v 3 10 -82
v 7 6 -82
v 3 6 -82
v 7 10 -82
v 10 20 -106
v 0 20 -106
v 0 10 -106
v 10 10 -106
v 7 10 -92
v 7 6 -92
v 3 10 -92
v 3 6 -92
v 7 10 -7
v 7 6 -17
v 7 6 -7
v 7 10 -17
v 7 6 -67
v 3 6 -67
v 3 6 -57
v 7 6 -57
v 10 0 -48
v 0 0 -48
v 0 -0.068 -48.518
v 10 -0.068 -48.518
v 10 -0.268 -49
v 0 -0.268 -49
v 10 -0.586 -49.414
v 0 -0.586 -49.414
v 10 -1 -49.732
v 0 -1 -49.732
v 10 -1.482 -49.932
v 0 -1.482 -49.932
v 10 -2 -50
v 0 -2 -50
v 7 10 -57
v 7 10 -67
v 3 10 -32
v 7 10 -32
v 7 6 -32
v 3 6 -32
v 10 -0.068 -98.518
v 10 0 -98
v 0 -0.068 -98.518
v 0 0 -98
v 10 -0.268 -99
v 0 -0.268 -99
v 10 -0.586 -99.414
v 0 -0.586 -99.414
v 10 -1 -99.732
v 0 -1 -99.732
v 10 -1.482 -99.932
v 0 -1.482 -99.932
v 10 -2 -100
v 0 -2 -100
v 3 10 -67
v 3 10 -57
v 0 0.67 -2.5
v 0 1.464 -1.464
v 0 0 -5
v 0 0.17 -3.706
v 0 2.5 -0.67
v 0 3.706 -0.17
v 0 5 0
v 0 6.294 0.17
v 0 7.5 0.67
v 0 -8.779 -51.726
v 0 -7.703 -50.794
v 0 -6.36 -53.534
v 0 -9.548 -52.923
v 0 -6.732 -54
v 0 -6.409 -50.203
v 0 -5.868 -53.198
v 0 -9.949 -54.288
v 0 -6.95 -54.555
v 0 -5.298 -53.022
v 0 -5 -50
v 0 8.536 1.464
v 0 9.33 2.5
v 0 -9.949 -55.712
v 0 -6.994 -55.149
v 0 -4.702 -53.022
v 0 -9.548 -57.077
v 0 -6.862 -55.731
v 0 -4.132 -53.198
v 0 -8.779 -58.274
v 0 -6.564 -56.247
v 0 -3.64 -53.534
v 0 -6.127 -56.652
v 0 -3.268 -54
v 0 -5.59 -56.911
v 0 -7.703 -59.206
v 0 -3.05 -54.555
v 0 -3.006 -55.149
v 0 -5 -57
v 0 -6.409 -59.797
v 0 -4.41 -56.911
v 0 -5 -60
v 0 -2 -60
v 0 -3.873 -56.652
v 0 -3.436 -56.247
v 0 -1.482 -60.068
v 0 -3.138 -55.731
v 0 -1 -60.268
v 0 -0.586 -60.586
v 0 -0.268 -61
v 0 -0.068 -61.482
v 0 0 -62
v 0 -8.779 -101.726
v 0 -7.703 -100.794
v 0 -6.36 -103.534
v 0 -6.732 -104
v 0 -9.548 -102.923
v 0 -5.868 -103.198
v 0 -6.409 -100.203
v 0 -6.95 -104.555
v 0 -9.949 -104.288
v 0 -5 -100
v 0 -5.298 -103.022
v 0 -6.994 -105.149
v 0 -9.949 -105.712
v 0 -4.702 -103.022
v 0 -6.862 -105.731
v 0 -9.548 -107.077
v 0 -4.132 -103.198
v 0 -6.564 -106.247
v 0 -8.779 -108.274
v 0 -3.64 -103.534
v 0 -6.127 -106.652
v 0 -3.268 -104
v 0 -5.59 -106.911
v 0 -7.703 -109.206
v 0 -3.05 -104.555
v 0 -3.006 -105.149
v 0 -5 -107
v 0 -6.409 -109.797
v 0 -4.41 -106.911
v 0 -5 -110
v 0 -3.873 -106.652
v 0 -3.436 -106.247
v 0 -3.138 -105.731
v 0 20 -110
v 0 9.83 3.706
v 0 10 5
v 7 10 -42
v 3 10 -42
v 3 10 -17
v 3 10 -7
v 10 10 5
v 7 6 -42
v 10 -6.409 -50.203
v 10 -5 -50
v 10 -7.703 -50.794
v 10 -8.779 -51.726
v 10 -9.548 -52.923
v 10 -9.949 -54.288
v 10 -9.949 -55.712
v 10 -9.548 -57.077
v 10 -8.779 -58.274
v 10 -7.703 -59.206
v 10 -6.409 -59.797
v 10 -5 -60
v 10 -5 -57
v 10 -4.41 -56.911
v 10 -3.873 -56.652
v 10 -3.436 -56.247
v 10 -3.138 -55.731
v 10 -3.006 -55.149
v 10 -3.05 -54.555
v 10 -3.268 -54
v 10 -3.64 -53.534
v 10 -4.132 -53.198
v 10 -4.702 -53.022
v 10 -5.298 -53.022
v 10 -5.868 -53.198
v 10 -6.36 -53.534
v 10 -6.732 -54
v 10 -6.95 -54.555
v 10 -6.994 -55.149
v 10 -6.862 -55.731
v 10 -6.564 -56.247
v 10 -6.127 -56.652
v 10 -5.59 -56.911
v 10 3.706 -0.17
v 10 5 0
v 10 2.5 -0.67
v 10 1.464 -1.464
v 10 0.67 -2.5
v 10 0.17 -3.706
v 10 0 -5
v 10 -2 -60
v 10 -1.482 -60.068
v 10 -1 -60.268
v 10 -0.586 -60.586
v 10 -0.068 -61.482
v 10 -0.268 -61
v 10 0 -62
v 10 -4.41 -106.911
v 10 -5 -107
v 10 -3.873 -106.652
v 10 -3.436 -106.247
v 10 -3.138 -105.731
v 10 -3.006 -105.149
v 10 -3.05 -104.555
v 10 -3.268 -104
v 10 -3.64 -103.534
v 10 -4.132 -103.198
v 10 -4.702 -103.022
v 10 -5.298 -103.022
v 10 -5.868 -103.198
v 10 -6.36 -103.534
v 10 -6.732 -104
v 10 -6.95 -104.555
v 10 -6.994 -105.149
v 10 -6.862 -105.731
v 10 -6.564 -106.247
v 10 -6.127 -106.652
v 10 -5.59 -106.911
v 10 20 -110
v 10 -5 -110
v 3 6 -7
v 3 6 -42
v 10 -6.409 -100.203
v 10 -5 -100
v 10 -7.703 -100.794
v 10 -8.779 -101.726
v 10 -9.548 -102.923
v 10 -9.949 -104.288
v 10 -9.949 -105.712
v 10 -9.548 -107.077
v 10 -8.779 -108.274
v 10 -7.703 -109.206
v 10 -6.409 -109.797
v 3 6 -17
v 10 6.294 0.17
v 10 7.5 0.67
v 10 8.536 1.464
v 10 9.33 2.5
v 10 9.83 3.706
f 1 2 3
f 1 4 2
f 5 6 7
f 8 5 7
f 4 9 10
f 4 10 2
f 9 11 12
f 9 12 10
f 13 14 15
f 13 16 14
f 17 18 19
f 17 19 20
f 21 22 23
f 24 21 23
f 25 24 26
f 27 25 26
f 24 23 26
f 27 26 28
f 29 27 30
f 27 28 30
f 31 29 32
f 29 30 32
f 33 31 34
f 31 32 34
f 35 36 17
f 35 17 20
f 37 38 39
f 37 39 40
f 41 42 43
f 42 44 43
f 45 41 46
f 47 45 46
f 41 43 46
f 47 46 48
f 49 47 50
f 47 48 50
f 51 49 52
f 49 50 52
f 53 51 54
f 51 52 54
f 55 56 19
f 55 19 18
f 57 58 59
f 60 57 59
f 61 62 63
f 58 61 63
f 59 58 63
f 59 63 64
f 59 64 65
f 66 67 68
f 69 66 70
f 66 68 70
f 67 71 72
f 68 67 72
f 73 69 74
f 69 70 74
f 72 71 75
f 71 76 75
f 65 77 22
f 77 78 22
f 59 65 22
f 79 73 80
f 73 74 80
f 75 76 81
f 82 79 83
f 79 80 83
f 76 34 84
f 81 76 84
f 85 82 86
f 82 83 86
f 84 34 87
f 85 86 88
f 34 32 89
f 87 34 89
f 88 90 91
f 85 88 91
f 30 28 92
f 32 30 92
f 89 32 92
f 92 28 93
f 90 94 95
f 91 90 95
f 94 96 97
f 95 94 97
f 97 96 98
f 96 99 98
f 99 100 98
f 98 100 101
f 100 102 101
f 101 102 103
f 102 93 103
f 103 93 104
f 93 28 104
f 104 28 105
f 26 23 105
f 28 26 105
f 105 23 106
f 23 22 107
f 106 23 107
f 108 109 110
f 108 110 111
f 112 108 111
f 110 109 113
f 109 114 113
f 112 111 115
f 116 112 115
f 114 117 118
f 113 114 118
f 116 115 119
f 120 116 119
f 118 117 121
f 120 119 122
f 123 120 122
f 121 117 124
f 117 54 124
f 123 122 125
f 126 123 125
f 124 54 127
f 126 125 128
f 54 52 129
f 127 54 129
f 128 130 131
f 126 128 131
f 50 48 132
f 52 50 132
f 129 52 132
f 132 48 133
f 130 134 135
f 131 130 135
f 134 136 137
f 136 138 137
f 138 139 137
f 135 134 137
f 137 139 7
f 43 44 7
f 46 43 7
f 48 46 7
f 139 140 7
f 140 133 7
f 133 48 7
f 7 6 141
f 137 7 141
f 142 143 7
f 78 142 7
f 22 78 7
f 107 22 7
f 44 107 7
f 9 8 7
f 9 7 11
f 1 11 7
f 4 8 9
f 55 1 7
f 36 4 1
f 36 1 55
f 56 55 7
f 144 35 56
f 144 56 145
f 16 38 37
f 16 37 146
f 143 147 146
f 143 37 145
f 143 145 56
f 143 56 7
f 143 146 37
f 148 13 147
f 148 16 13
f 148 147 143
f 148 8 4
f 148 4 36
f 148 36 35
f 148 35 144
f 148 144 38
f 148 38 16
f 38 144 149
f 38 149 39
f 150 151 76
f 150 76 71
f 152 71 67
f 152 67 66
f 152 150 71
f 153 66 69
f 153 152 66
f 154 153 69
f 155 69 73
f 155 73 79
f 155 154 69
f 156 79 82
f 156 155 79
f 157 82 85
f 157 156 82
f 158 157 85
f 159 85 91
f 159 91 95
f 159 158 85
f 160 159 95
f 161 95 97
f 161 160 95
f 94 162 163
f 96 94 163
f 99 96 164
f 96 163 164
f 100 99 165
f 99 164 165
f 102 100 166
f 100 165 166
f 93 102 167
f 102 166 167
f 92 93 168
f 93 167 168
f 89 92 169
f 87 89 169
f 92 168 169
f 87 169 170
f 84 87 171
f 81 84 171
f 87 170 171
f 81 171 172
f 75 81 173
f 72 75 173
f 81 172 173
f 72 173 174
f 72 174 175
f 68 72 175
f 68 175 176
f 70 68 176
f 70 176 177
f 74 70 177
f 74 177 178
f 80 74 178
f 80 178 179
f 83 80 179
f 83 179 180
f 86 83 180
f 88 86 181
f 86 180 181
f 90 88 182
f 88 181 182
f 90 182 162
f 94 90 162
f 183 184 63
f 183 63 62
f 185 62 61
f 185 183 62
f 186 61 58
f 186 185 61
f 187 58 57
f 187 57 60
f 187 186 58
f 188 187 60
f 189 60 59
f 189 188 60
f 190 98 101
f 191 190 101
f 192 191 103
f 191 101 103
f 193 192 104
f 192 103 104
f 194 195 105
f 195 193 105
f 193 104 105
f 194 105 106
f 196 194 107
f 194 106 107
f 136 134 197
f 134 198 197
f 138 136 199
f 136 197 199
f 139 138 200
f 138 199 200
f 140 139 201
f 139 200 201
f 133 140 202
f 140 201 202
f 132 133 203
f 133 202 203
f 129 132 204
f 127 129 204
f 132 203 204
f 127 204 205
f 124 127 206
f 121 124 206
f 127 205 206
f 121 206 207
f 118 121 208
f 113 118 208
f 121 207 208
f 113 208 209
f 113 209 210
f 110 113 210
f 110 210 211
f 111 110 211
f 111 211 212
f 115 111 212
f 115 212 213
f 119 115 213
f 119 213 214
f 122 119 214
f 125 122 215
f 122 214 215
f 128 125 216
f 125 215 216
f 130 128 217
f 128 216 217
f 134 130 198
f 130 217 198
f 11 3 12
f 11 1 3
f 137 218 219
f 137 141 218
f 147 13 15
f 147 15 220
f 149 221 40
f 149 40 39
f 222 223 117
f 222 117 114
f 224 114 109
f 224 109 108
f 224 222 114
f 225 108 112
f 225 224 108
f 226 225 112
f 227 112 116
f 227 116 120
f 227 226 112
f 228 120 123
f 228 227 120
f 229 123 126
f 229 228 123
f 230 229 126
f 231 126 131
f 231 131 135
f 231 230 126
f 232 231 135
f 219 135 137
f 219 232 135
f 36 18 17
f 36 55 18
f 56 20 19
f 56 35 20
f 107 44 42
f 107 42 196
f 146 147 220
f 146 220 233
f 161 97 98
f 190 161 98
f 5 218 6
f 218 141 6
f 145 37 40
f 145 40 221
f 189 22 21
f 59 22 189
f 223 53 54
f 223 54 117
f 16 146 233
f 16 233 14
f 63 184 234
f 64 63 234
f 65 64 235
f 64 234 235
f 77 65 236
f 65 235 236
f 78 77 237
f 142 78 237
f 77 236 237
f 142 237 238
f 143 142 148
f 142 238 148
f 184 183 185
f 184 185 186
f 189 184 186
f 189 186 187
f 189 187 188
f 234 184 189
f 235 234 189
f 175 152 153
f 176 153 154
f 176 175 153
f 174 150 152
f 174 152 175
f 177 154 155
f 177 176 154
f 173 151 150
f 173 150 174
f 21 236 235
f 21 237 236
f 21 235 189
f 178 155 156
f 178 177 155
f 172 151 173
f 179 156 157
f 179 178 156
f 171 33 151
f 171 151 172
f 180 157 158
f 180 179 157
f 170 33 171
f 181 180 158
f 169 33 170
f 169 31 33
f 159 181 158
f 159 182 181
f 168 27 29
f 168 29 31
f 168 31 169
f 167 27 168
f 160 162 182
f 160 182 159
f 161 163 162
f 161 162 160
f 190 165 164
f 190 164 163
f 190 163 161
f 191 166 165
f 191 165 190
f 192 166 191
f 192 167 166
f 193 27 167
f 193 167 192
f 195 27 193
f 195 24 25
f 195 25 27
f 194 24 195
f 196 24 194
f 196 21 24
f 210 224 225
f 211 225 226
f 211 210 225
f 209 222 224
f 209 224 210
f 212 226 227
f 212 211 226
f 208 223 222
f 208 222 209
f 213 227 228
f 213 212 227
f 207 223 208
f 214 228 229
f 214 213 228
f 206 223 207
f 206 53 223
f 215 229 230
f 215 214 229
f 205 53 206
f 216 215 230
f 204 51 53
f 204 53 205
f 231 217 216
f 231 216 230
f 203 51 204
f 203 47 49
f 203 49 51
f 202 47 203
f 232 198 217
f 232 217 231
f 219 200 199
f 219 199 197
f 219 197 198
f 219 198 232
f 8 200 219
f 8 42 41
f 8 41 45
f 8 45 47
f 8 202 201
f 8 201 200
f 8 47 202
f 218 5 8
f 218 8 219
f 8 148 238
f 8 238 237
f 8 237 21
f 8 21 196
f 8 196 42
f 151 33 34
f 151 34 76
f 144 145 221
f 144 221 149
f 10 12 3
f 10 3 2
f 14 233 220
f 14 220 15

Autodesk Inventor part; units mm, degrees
ref_plane "YZ Plane" through (0, 0, 0) normal (1, 0, 0) x (0, 1, 0)
ref_plane "XZ Plane" through (0, 0, 0) normal (0, 1, 0) x (-1, 0, 0)
ref_plane "XY Plane" through (0, 0, 0) normal (0, 0, 1) x (1, 0, 0)
sketch "Эскиз1" plane through (0, 0, 0) normal (1, 0, 0) x (0, 1, 0)
  line L0 (0, 0) -> (10, 0)
  line L1 (10, 0) -> (10, -110)
  line L2 (10, -110) -> (0, -110)
  line L3 (0, -110) -> (0, 0)
  line L4 (10, -110) -> (20, -110)
  line L5 (20, -110) -> (20, -106)
  line L6 (20, -106) -> (10, -106)
  line L7 (10, -106) -> (10, -110)
  dimension "d0" = 110
  dimension "d1" = 10
  dimension "d2" = 4
  dimension "d3" = 10
extrude "Выдавливание1" add sketch "Эскиз1" along normal blind 10
sketch "Эскиз2" plane through (0, 10, 0) normal (0, 1, 0) x (1, 0, 0)
  line L0 (0, 106) -> (10, 106) projected
  line L1 (5, 106) -> (5, 0)
  line L2 (0, 0) -> (10, 0) projected
  line L3 (7, 82) -> (3, 82)
  line L4 (3, 82) -> (3, 92)
  line L5 (3, 92) -> (7, 92)
  line L6 (7, 92) -> (7, 82)
  line L7 (7, 57) -> (3, 57)
  line L8 (3, 57) -> (3, 67)
  line L9 (3, 67) -> (7, 67)
  line L10 (7, 67) -> (7, 57)
  line L11 (7, 32) -> (3, 32)
  line L12 (3, 32) -> (3, 42)
  line L13 (3, 42) -> (7, 42)
  line L14 (7, 42) -> (7, 32)
  line L15 (7, 7) -> (3, 7)
  line L16 (3, 7) -> (3, 17)
  line L17 (3, 17) -> (7, 17)
  line L18 (7, 17) -> (7, 7)
  dimension "d6" = 10
  dimension "d7" = 10
  dimension "d8" = 10
  dimension "d9" = 10
  dimension "d10" = 4
  dimension "d11" = 4
  dimension "d12" = 4
  dimension "d13" = 14
  dimension "d14" = 15
  dimension "d15" = 15
  dimension "d16" = 15
extrude "Выдавливание2" cut sketch "Эскиз2" against normal blind 4
sketch "Эскиз3" plane through (10, 0, 0) normal (1, 0, 0) x (0, 0, -1)
  line L0 (106, 10) -> (0, 10) projected
  line L1 (0, 10) -> (-10, 10)
  line L2 (-10, 10) -> (-10, 0)
  line L3 (-10, 0) -> (0, 0)
  line L4 (0, 0) -> (0, 10)
  circle A0 centre (-5, 5) radius 5
  point P0 (-5, 10)
  point P1 (0, 5)
  dimension "d19" = 10
extrude "Выдавливание3" add sketch "Эскиз3" against normal blind 10 contours L4 A0 L1
fillet "Сопряжение1" radius 5 1 edges at (5, 0, 0)
sketch "Эскиз4" plane through (10, 0, 0) normal (1, 0, 0) x (0, 0, -1)
  line L0 (110, 0) -> (100, 0)
  line L1 (100, 0) -> (100, -5)
  line L2 (100, -5) -> (110, -5)
  line L3 (110, -5) -> (110, 0)
  circle A0 centre (105, -5) radius 5
  circle A1 centre (105, -5) radius 2
  line L4 (5, 0) -> (110, 0) projected
  line L5 (60, 0) -> (50, 0)
  line L6 (50, 0) -> (50, -5)
  line L7 (50, -5) -> (60, -5)
  line L8 (60, -5) -> (60, 0)
  circle A2 centre (55, -5) radius 5
  circle A3 centre (55, -5) radius 2
  point P0 (0, 0)
  dimension "d23" = 10
  dimension "d24" = 5
  dimension "d25" = 4
  dimension "d26" = 10
  dimension "d27" = 5
  dimension "d28" = 4
  dimension "d29" = 40
extrude "Выдавливание4" add sketch "Эскиз4" against normal blind 10 contours L3 A0 L0 | L8 A2 L4 | A0 L1 L0 | A0 L2 A1 | A0 L2 A1 | A2 L6 L4 | A2 L7 A3 | A2 L7 A3
fillet "Сопряжение2" radius 2 3 edges at (5, 0, -100) (5, 0, -50) (5, 0, -60)
properties part number "держак середины пушки"
